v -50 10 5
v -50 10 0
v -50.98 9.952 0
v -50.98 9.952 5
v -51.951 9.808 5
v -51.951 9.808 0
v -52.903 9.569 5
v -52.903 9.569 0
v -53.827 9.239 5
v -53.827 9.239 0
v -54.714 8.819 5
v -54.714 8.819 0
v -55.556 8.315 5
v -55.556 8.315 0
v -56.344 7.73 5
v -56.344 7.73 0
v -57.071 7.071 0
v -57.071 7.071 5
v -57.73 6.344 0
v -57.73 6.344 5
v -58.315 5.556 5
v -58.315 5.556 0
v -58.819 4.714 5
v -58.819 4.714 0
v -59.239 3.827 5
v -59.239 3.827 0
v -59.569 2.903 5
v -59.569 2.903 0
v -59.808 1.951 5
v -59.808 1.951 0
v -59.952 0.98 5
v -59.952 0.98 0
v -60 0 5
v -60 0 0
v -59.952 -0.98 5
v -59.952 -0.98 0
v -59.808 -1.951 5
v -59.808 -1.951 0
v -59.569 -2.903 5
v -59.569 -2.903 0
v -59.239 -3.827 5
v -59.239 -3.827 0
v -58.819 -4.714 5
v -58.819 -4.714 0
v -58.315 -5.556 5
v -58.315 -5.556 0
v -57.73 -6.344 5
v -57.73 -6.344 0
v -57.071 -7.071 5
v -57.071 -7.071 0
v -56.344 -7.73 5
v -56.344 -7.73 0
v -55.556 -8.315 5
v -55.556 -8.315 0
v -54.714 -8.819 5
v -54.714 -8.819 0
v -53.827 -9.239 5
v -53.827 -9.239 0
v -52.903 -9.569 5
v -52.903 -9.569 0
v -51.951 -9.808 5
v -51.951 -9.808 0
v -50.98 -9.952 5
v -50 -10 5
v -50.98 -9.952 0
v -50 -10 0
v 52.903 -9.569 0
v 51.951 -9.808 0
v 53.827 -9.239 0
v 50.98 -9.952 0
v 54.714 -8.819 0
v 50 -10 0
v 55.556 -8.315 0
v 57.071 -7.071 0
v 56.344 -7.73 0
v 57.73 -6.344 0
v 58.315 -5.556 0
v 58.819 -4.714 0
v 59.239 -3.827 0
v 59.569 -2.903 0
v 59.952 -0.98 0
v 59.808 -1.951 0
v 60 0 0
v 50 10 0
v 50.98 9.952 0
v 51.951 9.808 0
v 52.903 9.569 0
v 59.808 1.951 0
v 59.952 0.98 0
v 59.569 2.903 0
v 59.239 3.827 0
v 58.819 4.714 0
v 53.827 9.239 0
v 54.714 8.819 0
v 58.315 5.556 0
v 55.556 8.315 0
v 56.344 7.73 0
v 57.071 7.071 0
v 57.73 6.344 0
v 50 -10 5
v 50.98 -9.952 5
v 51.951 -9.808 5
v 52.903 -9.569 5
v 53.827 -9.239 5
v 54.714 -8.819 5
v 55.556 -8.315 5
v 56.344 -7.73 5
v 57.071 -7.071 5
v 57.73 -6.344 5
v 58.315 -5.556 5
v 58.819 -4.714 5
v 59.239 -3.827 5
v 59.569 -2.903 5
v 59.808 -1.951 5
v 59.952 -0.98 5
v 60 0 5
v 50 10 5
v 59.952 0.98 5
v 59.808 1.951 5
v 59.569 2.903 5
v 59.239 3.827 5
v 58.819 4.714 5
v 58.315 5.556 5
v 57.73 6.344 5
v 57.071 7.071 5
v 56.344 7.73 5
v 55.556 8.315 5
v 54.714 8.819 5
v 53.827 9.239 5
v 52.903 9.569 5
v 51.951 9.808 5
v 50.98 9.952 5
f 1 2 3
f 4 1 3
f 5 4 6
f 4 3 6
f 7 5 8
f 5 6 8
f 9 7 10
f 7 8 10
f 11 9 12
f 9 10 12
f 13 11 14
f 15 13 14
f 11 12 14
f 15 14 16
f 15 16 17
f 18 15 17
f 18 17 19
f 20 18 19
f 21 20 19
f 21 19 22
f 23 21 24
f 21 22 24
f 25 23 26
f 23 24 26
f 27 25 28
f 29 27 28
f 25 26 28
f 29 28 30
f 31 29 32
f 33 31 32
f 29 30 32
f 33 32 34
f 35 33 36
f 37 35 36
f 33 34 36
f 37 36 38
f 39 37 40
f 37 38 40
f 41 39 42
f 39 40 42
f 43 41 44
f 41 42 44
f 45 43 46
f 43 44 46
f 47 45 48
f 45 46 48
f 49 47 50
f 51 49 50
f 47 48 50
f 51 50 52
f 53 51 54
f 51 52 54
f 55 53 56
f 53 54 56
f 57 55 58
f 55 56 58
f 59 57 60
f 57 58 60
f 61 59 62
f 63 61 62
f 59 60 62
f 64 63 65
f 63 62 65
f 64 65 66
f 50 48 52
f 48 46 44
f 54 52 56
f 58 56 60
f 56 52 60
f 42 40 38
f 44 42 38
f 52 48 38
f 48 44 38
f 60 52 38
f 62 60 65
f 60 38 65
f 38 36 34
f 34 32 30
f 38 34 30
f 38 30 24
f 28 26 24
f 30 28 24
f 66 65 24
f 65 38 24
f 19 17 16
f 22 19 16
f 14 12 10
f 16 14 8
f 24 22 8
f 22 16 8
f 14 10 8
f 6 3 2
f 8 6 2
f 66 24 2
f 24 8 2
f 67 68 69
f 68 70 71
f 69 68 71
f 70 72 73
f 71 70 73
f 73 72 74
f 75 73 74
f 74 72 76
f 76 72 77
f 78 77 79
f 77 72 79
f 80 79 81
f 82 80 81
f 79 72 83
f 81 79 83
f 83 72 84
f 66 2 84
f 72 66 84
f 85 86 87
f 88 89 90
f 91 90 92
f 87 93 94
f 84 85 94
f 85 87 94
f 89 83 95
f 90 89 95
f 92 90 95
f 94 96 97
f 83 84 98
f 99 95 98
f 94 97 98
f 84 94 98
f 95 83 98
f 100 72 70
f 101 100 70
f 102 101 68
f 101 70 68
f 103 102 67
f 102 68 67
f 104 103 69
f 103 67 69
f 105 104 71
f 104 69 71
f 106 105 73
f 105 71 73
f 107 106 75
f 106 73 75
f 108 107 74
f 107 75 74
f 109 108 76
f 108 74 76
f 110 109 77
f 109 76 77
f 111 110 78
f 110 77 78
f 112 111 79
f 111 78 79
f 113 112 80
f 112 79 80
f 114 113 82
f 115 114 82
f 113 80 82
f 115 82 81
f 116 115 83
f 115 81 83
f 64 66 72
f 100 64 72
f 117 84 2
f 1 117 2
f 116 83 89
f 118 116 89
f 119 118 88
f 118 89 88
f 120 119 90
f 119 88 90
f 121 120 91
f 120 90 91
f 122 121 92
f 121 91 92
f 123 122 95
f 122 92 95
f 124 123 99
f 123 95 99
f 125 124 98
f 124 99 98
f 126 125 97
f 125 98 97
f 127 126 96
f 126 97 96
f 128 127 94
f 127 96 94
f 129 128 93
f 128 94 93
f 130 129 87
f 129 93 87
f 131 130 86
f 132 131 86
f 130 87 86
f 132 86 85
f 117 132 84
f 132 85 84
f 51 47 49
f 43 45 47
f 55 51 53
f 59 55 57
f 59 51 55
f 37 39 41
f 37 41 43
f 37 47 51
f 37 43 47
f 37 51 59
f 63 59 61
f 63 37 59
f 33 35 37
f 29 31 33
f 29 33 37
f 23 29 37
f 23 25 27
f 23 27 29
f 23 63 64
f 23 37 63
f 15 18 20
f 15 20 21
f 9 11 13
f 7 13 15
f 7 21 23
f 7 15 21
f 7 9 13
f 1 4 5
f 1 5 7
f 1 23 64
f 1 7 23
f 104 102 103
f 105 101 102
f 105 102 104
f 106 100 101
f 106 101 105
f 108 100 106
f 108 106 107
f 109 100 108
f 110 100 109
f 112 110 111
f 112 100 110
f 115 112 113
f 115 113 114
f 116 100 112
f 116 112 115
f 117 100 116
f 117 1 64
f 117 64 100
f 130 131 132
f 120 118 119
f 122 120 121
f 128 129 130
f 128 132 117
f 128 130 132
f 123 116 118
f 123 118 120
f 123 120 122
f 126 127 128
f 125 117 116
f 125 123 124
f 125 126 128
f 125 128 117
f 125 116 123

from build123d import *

# Parameters (mm, degrees)
F1_DEPTH = 5


with BuildPart() as f1:
    # F0 (on Top) → F1 (new body)
    with BuildSketch(Plane.XY):
        with BuildLine():
            ThreePointArc((50, -10), (40, 0), (50, 10))
            Line((50, 10), (-50, 10))
            ThreePointArc((-50, 10), (-42.9289321881, 7.0710678119), (-40, 0))
            ThreePointArc((-40, 0), (-42.9289321881, -7.0710678119), (-50, -10))
            Line((-50, -10), (50, -10))
        make_face()
        with BuildLine():
            ThreePointArc((60, 0), (57.0710678119, 7.0710678119), (50, 10))
            Line((50, 10), (50, -10))
            ThreePointArc((50, -10), (57.0710678119, -7.0710678119), (60, 0))
        make_face()
        with BuildLine():
            Line((50, -10), (50, 10))
            ThreePointArc((50, 10), (40, 0), (50, -10))
        make_face()
        with BuildLine():
            ThreePointArc((-40, 0), (-42.9289321881, 7.0710678119), (-50, 10))
            Line((-50, 10), (-50, -10))
            ThreePointArc((-50, -10), (-42.9289321881, -7.0710678119), (-40, 0))
        make_face()
        with BuildLine():
            Line((-50, -10), (-50, 10))
            ThreePointArc((-50, 10), (-60, 0), (-50, -10))
        make_face()
    extrude(amount=F1_DEPTH)


solid = f1.part
